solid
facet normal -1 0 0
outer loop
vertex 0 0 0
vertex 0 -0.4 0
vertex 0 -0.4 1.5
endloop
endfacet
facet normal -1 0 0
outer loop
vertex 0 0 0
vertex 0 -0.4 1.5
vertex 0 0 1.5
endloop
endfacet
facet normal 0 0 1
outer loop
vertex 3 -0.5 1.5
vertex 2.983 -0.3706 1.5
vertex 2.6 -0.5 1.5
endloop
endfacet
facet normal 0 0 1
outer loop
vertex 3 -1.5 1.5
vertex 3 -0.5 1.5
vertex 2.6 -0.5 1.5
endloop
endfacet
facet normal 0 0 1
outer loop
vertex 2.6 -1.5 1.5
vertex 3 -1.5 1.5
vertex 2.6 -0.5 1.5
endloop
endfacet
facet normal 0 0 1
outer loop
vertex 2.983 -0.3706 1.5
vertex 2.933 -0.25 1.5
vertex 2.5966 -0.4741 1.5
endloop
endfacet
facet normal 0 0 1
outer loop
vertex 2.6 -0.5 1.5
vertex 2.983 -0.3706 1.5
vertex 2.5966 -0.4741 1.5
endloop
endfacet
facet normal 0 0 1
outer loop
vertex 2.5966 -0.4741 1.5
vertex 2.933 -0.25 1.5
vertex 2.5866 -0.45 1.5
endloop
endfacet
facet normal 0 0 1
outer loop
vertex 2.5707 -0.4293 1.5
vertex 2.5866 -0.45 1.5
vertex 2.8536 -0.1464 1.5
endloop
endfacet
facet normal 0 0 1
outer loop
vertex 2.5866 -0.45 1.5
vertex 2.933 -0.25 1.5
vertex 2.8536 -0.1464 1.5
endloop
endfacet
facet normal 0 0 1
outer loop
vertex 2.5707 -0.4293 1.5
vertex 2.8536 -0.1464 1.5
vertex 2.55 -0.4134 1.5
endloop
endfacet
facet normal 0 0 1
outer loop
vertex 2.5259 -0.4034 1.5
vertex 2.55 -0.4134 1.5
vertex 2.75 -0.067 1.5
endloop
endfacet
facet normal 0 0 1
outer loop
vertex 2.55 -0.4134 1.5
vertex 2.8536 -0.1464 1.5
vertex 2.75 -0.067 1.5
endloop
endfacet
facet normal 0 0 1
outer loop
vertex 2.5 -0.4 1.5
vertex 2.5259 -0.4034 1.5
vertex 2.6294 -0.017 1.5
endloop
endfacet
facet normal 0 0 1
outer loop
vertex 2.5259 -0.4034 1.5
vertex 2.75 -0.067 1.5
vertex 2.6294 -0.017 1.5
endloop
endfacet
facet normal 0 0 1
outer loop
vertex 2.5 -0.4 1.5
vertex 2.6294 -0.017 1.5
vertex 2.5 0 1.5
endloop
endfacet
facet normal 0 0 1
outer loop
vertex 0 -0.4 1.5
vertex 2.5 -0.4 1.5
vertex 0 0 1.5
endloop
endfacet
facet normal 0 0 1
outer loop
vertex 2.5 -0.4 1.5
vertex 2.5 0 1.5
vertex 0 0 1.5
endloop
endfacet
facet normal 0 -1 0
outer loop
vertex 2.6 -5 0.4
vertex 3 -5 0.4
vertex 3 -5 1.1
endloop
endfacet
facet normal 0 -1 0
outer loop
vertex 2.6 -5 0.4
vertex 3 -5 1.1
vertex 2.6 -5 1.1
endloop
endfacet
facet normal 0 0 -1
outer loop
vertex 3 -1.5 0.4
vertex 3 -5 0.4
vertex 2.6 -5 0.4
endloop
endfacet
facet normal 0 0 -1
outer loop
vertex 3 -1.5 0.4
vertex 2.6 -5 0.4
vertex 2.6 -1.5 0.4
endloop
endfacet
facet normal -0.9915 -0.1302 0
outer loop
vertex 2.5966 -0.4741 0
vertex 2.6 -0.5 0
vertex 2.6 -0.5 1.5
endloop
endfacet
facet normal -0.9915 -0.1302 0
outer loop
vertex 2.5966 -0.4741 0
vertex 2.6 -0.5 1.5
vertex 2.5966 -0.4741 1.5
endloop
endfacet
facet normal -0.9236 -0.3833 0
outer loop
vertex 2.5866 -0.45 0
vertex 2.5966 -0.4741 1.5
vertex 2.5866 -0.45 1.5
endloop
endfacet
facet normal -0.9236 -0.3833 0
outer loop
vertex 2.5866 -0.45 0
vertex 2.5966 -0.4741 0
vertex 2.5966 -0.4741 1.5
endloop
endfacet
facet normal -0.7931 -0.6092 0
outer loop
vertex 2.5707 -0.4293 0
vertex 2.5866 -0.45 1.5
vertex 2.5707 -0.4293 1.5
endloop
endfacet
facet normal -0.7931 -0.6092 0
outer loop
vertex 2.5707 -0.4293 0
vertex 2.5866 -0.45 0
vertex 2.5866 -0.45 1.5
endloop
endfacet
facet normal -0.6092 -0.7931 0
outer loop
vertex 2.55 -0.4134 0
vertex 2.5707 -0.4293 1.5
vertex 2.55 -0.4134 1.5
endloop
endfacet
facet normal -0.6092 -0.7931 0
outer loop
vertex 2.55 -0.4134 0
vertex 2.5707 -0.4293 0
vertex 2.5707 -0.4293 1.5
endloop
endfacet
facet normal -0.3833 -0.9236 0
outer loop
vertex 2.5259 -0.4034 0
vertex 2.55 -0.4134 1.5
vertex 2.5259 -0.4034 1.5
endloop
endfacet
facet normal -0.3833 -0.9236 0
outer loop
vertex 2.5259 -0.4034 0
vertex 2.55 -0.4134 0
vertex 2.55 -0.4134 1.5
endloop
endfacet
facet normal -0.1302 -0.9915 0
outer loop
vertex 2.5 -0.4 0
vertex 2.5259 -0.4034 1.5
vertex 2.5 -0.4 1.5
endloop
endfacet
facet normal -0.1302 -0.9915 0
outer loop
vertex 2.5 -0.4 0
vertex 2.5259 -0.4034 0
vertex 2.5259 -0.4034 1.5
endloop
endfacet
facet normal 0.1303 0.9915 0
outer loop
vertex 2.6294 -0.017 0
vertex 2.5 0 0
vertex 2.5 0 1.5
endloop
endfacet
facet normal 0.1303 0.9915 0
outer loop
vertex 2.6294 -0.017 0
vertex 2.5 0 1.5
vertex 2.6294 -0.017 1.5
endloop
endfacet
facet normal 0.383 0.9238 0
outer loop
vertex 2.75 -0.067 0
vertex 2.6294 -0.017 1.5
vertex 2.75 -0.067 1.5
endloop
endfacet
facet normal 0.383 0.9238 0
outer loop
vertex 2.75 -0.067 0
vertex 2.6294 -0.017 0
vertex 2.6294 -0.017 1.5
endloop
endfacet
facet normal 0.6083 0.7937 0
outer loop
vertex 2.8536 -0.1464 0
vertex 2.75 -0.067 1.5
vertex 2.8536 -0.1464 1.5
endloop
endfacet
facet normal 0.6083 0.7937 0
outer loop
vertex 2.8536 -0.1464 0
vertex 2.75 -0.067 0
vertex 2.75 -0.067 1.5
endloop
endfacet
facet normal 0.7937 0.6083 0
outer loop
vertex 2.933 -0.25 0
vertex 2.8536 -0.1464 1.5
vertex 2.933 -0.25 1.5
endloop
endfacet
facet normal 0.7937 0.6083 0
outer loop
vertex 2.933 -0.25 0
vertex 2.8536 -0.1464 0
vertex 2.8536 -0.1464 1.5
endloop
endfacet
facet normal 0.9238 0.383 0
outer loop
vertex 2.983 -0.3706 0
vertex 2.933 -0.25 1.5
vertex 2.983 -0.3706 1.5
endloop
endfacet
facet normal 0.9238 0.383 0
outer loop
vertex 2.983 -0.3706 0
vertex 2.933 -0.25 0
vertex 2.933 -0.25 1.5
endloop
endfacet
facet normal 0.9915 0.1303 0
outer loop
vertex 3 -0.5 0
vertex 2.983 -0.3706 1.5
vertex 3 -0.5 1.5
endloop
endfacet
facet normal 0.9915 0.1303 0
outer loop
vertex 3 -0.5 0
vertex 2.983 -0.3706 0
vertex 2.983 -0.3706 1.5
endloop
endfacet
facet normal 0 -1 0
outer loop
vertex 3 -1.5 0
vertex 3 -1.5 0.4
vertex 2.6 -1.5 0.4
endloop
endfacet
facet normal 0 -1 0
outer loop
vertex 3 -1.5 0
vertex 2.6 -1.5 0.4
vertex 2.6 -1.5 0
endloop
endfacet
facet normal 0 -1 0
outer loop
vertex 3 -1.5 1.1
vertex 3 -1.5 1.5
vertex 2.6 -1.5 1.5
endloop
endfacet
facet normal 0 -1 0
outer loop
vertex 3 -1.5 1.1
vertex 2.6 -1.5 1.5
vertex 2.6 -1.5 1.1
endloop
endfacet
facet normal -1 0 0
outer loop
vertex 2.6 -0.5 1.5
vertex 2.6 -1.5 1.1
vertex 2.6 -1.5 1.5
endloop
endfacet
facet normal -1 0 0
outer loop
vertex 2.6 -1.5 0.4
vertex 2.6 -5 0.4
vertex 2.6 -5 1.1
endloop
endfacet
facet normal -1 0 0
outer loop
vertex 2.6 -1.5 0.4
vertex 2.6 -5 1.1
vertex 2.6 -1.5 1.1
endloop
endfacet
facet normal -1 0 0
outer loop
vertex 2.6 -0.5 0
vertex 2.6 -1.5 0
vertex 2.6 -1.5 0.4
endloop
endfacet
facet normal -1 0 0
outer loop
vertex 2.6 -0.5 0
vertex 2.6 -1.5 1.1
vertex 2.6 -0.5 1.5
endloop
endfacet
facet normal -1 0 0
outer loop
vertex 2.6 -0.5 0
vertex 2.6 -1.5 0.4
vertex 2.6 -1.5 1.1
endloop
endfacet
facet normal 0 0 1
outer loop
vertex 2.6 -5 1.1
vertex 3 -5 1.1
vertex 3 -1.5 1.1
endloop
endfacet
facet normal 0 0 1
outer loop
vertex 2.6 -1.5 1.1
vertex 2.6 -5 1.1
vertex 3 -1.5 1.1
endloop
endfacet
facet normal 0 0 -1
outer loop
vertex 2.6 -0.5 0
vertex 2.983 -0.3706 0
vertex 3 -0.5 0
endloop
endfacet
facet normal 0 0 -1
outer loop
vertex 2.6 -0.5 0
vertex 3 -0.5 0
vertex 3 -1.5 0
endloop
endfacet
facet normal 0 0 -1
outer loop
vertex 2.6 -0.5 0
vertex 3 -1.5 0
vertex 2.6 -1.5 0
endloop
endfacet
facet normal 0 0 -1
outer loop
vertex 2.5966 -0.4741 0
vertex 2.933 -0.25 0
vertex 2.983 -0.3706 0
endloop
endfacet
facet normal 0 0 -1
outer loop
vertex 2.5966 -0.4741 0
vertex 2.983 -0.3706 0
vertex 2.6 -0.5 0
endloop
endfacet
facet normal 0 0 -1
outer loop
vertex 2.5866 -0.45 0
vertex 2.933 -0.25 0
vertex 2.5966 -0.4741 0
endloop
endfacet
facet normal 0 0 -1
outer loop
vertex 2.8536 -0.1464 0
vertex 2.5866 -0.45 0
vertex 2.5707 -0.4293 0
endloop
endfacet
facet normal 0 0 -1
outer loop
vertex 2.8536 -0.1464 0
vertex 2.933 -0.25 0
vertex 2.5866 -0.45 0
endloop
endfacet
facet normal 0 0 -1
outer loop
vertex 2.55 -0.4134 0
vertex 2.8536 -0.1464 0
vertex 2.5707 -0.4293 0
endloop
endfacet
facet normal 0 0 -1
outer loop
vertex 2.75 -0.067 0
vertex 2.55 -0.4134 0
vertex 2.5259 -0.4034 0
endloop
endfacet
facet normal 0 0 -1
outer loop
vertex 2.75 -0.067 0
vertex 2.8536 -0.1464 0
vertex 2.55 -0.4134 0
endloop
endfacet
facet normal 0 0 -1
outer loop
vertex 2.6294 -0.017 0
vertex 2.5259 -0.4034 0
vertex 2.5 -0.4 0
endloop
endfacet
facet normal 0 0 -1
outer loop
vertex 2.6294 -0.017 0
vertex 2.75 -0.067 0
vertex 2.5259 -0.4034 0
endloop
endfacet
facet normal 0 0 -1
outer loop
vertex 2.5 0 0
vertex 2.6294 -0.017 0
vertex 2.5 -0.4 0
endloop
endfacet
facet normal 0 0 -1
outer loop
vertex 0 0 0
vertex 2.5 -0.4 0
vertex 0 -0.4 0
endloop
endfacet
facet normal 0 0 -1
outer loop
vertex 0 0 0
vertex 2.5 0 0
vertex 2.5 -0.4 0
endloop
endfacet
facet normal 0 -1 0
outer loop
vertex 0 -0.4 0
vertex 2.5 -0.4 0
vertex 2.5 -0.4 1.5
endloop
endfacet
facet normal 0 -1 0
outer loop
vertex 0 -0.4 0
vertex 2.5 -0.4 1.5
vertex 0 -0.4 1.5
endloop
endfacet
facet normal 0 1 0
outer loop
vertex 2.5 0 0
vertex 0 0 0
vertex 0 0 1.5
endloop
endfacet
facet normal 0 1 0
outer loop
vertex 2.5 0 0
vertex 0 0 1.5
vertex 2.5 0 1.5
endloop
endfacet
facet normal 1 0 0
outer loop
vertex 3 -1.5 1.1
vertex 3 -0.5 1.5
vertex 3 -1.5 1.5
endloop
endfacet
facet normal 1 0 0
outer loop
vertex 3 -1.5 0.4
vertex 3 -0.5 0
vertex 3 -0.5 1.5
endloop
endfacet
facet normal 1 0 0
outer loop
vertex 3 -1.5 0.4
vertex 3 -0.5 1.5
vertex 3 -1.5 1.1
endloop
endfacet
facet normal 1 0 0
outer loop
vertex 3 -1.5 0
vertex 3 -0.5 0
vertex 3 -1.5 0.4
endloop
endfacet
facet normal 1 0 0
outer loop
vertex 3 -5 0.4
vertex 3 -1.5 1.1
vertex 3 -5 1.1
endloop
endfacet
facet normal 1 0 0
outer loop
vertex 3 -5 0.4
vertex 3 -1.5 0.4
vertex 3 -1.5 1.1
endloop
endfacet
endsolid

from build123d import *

# Parameters (mm, degrees)
BOSS_EXTRUDE1_DEPTH = 1.5
SKETCH2_W           = 0.4
SKETCH2_H           = 3.5
CUT_EXTRUDE1_DEPTH  = 1.5


with BuildPart() as part:
    # Sketch1 → Boss-Extrude1 (new body)
    with BuildSketch(Plane.XY):
        with BuildLine():
            Line((0, 0), (2.5, 0))
            ThreePointArc((2.5, 0), (2.853553391, -0.146446609), (3, -0.5))
            Line((3, -0.5), (3, -5))
            Line((3, -5), (2.6, -5))
            Line((2.6, -5), (2.6, -0.5))
            ThreePointArc((2.6, -0.5), (2.570710678, -0.429289322), (2.5, -0.4))
            Line((2.5, -0.4), (0, -0.4))
            Line((0, -0.4), (0, 0))
        make_face()
    extrude(amount=BOSS_EXTRUDE1_DEPTH)

    # Sketch2 → Cut-Extrude1 (cut)
    with BuildSketch(Plane(origin=(3, 0, 0), x_dir=(0, 0, -1), z_dir=(1, 0, 0))):
        with Locations((-1.3, -3.25)):
            Rectangle(SKETCH2_W, SKETCH2_H)
        with Locations((-0.2, -3.25)):
            Rectangle(SKETCH2_W, SKETCH2_H)
    extrude(amount=-CUT_EXTRUDE1_DEPTH, mode=Mode.SUBTRACT)


solid = part.part
